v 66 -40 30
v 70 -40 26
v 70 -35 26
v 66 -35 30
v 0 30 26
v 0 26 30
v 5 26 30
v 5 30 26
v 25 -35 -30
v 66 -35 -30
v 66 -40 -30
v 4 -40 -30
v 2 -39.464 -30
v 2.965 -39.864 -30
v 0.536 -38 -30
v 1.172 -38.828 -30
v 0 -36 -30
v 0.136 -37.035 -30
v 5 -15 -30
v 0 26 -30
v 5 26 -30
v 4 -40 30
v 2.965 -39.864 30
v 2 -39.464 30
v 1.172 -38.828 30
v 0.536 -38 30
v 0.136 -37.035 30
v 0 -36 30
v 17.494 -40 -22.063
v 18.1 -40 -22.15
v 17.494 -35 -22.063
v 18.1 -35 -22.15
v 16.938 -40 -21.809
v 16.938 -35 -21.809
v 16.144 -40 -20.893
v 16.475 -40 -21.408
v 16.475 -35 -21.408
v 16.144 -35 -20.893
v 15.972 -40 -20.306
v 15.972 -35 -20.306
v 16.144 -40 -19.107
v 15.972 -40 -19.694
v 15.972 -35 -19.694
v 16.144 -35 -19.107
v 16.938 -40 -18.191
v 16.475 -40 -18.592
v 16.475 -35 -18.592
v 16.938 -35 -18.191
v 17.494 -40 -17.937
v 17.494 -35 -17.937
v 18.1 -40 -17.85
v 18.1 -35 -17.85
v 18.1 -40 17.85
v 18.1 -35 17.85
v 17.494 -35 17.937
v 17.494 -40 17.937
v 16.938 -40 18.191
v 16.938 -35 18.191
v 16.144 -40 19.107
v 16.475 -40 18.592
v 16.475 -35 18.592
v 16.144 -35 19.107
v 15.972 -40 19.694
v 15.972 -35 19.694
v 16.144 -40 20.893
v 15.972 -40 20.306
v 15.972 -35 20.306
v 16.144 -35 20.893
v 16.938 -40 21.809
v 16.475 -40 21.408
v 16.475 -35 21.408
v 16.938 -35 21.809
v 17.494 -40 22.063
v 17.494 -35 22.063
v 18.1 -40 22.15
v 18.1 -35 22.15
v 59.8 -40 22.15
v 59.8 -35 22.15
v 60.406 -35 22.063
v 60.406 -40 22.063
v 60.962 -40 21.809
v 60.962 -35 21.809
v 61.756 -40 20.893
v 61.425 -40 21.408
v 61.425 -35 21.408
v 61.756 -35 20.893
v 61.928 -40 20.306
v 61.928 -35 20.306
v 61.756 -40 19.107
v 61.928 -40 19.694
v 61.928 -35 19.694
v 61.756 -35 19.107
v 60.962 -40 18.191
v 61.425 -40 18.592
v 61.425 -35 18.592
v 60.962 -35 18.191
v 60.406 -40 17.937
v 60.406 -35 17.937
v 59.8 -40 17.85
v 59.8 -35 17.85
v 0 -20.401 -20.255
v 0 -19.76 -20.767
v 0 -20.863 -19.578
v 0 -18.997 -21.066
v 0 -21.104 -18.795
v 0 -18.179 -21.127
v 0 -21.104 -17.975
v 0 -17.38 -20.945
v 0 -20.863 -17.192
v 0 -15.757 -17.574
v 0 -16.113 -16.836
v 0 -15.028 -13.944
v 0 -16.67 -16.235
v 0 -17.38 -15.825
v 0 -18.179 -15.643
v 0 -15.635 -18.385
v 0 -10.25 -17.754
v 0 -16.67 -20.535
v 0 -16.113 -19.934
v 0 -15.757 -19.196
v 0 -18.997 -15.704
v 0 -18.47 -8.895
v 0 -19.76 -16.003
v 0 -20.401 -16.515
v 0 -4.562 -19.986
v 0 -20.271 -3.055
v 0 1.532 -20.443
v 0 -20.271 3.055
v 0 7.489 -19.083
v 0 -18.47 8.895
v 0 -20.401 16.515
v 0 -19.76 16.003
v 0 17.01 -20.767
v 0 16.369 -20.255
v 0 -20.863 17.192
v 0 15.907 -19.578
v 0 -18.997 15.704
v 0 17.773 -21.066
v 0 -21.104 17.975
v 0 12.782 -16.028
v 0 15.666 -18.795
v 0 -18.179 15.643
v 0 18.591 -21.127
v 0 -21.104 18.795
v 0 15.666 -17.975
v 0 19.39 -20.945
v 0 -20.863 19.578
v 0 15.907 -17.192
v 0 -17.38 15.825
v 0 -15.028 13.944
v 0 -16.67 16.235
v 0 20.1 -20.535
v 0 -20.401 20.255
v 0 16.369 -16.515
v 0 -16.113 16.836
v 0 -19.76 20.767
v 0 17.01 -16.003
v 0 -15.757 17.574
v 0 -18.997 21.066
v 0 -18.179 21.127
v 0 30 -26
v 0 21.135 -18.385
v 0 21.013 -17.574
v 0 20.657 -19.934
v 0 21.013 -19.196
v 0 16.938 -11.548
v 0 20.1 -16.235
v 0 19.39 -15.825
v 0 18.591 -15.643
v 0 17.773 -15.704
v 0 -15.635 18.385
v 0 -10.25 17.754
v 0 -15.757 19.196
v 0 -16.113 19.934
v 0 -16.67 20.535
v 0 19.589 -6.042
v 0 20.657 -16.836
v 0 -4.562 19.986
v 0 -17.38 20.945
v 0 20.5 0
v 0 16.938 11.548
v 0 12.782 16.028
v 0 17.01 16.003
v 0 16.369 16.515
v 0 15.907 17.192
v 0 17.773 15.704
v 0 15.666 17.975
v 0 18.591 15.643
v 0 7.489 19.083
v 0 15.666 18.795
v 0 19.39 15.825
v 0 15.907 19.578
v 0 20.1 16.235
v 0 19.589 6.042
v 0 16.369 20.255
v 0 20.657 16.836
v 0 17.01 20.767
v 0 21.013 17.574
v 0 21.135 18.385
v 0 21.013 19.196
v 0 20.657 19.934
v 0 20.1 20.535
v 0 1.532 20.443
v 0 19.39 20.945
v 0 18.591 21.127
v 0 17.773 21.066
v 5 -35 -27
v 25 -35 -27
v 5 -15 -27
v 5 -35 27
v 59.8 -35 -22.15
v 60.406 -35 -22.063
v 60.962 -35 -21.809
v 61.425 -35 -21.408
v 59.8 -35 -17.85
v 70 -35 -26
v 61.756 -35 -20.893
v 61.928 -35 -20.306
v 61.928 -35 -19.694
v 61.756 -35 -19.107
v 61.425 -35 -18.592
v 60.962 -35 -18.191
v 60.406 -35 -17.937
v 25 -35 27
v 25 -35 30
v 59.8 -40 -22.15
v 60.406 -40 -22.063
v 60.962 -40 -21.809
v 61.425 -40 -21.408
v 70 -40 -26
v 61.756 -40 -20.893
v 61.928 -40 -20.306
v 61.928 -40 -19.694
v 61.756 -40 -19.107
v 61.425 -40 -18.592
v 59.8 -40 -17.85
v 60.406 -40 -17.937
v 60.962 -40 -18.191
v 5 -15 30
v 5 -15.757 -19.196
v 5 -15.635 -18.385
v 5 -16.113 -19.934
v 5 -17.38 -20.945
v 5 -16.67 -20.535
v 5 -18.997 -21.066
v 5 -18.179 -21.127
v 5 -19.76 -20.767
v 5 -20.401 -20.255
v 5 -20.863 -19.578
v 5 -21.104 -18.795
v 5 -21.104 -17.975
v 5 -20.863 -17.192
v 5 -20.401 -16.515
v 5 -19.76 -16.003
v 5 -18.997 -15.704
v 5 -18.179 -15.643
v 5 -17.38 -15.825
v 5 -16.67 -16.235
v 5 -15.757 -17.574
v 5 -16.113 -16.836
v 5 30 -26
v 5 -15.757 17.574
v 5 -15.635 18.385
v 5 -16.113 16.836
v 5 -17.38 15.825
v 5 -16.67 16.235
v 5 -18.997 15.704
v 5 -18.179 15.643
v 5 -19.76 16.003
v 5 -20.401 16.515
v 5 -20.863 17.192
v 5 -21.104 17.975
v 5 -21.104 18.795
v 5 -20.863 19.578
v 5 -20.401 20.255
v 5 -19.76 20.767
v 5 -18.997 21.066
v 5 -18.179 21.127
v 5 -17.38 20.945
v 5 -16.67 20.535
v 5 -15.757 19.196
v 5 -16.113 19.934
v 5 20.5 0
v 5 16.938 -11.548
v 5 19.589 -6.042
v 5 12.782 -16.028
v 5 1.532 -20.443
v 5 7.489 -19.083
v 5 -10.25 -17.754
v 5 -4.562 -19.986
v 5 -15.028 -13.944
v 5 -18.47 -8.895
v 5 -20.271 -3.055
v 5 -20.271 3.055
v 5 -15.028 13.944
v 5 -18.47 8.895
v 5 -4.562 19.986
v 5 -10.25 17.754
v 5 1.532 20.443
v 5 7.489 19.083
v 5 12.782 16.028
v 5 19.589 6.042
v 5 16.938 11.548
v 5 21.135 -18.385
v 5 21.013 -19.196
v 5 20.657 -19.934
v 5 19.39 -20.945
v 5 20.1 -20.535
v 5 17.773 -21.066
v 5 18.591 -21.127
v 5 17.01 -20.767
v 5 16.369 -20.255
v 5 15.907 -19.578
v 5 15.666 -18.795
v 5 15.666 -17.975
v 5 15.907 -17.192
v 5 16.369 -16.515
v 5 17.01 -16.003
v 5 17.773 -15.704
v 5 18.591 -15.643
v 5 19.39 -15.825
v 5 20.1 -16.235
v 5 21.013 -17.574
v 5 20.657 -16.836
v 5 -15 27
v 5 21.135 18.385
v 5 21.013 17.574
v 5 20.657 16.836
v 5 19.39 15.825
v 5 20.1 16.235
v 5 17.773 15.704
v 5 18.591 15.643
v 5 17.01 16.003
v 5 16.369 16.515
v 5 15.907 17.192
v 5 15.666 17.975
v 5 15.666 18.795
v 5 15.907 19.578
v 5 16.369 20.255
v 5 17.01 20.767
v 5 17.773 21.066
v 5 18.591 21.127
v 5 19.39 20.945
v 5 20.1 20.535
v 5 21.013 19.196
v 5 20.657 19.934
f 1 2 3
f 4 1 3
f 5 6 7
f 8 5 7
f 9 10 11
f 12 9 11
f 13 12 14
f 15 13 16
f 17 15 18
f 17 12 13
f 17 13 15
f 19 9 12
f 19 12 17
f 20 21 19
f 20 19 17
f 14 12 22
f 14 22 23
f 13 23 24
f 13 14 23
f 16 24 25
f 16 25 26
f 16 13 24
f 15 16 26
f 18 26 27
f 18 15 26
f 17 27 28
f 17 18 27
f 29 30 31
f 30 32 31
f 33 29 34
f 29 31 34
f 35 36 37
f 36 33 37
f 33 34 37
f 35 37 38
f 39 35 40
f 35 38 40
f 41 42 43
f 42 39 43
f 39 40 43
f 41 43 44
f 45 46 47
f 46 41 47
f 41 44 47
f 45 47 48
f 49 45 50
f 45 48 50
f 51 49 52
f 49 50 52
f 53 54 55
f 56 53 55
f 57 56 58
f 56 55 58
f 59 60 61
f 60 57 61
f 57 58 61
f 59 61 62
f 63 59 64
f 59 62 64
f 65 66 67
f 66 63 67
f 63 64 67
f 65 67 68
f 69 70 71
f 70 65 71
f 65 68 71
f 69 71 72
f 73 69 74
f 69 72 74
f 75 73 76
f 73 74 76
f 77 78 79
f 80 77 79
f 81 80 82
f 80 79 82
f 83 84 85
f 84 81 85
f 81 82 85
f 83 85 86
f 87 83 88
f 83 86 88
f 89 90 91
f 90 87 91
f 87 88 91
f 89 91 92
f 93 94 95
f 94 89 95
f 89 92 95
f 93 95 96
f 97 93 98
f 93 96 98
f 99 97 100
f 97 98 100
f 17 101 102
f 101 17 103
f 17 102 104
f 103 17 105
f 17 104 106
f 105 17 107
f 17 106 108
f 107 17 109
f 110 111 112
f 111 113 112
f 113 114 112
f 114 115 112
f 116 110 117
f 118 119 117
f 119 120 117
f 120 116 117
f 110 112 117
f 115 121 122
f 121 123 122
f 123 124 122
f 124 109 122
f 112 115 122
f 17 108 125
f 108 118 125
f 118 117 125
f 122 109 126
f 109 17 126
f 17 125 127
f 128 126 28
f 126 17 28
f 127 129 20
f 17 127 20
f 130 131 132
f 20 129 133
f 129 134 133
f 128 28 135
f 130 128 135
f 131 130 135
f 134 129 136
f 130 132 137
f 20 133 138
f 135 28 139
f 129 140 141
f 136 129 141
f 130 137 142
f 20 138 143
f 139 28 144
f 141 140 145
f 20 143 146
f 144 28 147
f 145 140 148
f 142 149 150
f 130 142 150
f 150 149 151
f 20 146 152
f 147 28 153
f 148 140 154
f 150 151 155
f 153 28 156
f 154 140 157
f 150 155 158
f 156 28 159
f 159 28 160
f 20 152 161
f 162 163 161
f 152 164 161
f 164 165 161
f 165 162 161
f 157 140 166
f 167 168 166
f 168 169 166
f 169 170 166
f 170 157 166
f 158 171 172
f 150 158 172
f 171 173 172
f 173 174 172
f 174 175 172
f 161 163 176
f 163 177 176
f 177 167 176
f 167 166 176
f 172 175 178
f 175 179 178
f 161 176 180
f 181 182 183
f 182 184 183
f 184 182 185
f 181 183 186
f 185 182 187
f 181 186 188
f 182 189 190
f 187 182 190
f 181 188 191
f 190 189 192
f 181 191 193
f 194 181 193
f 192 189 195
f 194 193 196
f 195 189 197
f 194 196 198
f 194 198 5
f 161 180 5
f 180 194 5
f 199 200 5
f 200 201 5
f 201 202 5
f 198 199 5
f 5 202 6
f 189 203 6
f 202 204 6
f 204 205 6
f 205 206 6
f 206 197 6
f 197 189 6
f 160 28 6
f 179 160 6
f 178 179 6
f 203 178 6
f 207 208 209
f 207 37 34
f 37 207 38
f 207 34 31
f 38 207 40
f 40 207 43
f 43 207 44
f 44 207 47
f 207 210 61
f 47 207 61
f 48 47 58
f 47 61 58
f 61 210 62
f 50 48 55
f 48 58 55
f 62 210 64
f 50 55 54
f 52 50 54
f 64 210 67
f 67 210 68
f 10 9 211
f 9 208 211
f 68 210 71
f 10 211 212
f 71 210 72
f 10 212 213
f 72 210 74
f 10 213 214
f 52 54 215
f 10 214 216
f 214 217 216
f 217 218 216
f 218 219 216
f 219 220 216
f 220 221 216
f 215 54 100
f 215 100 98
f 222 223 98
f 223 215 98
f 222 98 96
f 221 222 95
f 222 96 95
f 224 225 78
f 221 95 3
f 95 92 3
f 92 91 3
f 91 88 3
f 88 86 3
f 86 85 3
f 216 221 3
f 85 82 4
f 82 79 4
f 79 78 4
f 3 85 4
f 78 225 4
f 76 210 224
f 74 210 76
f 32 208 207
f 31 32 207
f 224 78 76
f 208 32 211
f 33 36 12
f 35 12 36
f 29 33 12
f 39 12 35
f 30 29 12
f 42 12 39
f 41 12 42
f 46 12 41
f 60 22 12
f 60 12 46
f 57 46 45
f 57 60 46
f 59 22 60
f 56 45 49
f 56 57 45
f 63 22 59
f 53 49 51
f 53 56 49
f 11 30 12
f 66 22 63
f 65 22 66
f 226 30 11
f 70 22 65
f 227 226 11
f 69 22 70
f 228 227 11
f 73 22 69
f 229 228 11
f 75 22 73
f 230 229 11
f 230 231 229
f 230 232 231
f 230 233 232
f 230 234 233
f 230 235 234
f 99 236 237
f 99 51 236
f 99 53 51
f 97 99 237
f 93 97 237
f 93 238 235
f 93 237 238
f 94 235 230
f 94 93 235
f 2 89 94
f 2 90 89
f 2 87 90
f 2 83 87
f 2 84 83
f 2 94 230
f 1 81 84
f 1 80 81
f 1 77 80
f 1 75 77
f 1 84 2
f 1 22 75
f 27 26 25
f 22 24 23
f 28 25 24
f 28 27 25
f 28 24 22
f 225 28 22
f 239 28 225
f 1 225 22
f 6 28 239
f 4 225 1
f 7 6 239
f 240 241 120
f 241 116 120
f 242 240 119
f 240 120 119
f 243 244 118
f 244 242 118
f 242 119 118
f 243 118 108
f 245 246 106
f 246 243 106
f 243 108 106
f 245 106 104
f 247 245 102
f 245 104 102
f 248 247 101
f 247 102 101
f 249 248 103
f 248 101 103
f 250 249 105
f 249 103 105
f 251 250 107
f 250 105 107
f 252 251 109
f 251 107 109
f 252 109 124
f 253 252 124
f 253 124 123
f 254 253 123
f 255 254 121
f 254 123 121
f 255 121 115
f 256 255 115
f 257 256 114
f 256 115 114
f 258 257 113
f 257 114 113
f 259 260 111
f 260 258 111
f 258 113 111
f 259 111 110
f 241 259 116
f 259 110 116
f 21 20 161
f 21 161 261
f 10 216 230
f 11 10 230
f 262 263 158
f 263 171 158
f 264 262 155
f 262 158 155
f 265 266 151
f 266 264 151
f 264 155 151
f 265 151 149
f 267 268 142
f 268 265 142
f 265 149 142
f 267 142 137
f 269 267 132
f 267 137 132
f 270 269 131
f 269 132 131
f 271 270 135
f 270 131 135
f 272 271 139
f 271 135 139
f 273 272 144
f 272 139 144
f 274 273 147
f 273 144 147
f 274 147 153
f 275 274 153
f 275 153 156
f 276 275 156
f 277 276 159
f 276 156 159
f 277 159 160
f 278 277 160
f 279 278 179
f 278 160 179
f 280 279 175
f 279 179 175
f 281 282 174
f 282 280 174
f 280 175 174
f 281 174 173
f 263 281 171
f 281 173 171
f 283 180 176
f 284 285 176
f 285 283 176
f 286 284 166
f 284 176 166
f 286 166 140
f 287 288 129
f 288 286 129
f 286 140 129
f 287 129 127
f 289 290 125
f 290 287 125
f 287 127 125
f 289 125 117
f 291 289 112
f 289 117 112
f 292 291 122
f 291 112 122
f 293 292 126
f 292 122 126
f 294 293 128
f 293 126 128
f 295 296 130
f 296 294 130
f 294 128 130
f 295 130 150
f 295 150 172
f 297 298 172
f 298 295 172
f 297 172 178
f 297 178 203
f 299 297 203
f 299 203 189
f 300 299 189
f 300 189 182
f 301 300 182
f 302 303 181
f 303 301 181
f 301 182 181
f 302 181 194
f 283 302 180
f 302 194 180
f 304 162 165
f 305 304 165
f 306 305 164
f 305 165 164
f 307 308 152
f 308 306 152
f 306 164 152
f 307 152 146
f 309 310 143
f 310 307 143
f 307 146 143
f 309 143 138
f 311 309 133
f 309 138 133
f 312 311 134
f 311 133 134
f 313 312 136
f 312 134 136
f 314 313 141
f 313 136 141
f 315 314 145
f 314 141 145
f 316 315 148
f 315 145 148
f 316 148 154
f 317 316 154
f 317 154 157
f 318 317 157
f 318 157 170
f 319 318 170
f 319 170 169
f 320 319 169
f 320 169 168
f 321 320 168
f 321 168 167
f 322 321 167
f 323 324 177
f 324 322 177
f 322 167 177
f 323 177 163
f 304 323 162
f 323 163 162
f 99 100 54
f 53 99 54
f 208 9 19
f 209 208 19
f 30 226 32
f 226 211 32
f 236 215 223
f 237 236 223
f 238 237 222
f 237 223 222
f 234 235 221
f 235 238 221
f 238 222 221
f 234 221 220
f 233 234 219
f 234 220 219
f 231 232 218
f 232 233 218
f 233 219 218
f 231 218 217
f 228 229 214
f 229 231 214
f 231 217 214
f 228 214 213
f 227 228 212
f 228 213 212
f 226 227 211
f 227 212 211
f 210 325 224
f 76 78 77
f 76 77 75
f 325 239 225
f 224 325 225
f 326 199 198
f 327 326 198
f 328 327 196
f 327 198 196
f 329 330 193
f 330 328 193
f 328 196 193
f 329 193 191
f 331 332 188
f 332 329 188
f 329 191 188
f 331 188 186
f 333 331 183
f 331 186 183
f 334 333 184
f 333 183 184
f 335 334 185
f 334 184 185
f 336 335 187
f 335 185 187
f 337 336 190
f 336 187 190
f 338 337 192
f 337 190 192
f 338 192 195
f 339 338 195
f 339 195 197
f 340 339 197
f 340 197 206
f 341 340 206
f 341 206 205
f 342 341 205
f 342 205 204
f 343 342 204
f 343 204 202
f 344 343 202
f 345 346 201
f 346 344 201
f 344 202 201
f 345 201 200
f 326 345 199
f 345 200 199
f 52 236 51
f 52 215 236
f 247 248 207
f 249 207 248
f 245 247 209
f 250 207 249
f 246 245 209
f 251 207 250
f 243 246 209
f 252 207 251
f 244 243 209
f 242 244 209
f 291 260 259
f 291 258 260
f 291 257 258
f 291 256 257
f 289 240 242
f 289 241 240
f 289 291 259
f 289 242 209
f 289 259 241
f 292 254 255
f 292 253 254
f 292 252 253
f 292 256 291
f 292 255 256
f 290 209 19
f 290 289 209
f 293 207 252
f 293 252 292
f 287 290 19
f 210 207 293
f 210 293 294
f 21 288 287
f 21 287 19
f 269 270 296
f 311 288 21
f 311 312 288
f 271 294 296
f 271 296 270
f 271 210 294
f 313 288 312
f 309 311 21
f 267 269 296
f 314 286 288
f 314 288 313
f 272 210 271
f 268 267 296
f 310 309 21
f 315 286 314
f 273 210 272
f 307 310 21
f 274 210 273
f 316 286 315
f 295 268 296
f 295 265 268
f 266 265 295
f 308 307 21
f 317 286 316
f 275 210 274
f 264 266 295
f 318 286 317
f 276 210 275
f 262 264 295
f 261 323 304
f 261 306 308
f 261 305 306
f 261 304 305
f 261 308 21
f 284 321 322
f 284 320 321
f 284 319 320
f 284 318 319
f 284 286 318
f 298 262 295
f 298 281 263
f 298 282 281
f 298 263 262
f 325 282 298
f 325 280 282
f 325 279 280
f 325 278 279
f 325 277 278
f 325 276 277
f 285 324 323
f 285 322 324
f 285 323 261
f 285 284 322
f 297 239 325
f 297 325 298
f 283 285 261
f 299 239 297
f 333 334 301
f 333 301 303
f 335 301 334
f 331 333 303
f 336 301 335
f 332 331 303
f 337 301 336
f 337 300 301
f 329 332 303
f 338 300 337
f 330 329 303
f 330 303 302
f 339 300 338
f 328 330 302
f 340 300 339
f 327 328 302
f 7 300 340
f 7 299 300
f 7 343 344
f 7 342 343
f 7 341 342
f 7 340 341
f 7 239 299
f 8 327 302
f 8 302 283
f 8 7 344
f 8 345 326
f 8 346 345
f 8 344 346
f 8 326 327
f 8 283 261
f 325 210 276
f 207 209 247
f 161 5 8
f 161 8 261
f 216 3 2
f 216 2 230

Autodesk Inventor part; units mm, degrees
ref_plane "YZ Plane" through (0, 0, 0) normal (1, 0, 0) x (0, 1, 0)
ref_plane "XZ Plane" through (0, 0, 0) normal (0, 1, 0) x (-1, 0, 0)
ref_plane "XY Plane" through (0, 0, 0) normal (0, 0, 1) x (1, 0, 0)
sketch "Sketch5" plane through (0, 0, 0) normal (1, 0, 0) x (0, 1, 0)
  line L0 (30, 30) -> (30, -30)
  line L1 (30, -30) -> (-35, -30)
  line L2 (-35, -30) -> (-35, 30)
  line L3 (30, 30) -> (-35, 30)
  circle A0 centre (0, 0) radius 20.5
  circle A1 centre (18.385, 18.385) radius 2.75
  circle A2 centre (18.385, -18.385) radius 2.75
  circle A3 centre (-18.385, 18.385) radius 2.75
  circle A4 centre (-18.385, -18.385) radius 2.75
  dimension "d47" = 60
  dimension "d48" = 65
  dimension "d49" = 60
  dimension "d50" = 41
  dimension "d55" = 5.5
  dimension "d56" = 5.5
  dimension "d57" = 5.5
  dimension "d58" = 5.5
extrude "Extrusion5" add sketch "Sketch5" along normal blind 5
sketch "Sketch6" plane through (0, -35, -30) normal (0, -1, 0) x (1, 0, 0)
  line L0 (0, 60) -> (0, 0) projected
  line L1 (0, 60) -> (70, 60)
  line L2 (70, 60) -> (70, 0)
  line L3 (70, 0) -> (0, 0)
  line L4 (0, 0) -> (0, 60)
  line L5 (70, 60) -> (59.8, 60)
  arc A0 (59.8, 47.85) -> (59.8, 52.15) centre (59.8, 50) ccw
  arc A1 (59.8, 7.85) -> (59.8, 12.15) centre (59.8, 10) ccw
  arc A2 (18.1, 52.15) -> (18.1, 47.85) centre (18.1, 50) ccw
  arc A3 (18.1, 12.15) -> (18.1, 7.85) centre (18.1, 10) ccw
  line L6 (59.8, 47.85) -> (18.1, 47.85)
  line L7 (59.8, 52.15) -> (18.1, 52.15)
  line L8 (59.8, 7.85) -> (18.1, 7.85)
  line L9 (59.8, 12.15) -> (18.1, 12.15)
  point P0 (0, 30)
  dimension "d61" = 70
  dimension "d62" = 60
  dimension "d65" = 4.3
  dimension "d67" = 4.3
  dimension "d69" = 4.3
  dimension "d71" = 4.3
extrude "Extrusion6" add sketch "Sketch6" along normal blind 5
chamfer "Chamfer1" distance 4 angle 45 1 edges at (2.5, 30, -30)
chamfer "Chamfer2" distance 4 angle 45 1 edges at (2.5, 30, 30)
chamfer "Chamfer3" distance 4 angle 45 1 edges at (70, -37.5, 30)
chamfer "Chamfer4" distance 4 angle 45 1 edges at (70, -37.5, -30)
fillet "Fillet2" radius 4 1 edges at (0, -40, 0)
sketch "Sketch7" plane through (0, 26, 30) normal (0, 0, 1) x (1, 0, 0)
  line L0 (5, -61) -> (66, -61) projected
  line L1 (5, -61) -> (25, -61)
  line L2 (5, -61) -> (5, -41)
  line L3 (5, -61) -> (5, 0) projected
  line L4 (5, -41) -> (25, -61)
  point P0 (0, -26)
  dimension "d87" = 20
  dimension "d88" = 20
extrude "Extrusion7" add sketch "Sketch7" against normal blind 3
sketch "Sketch8" plane through (5, 26, -30) normal (0, 0, -1) x (-1, 0, 0)
  line L0 (0, -61) -> (-61, -61) projected
  line L1 (0, 0) -> (0, -41) projected
  line L2 (0, -61) -> (0, -41)
  line L3 (-20, -61) -> (0, -41) projected
  line L4 (0, -61) -> (-20, -61)
  line L5 (-20, -61) -> (0, -41)
  point P0 (5, -26)
extrude "Extrusion8" add sketch "Sketch8" against normal blind 3
properties part number "mount" material "Aluminum 6061"
